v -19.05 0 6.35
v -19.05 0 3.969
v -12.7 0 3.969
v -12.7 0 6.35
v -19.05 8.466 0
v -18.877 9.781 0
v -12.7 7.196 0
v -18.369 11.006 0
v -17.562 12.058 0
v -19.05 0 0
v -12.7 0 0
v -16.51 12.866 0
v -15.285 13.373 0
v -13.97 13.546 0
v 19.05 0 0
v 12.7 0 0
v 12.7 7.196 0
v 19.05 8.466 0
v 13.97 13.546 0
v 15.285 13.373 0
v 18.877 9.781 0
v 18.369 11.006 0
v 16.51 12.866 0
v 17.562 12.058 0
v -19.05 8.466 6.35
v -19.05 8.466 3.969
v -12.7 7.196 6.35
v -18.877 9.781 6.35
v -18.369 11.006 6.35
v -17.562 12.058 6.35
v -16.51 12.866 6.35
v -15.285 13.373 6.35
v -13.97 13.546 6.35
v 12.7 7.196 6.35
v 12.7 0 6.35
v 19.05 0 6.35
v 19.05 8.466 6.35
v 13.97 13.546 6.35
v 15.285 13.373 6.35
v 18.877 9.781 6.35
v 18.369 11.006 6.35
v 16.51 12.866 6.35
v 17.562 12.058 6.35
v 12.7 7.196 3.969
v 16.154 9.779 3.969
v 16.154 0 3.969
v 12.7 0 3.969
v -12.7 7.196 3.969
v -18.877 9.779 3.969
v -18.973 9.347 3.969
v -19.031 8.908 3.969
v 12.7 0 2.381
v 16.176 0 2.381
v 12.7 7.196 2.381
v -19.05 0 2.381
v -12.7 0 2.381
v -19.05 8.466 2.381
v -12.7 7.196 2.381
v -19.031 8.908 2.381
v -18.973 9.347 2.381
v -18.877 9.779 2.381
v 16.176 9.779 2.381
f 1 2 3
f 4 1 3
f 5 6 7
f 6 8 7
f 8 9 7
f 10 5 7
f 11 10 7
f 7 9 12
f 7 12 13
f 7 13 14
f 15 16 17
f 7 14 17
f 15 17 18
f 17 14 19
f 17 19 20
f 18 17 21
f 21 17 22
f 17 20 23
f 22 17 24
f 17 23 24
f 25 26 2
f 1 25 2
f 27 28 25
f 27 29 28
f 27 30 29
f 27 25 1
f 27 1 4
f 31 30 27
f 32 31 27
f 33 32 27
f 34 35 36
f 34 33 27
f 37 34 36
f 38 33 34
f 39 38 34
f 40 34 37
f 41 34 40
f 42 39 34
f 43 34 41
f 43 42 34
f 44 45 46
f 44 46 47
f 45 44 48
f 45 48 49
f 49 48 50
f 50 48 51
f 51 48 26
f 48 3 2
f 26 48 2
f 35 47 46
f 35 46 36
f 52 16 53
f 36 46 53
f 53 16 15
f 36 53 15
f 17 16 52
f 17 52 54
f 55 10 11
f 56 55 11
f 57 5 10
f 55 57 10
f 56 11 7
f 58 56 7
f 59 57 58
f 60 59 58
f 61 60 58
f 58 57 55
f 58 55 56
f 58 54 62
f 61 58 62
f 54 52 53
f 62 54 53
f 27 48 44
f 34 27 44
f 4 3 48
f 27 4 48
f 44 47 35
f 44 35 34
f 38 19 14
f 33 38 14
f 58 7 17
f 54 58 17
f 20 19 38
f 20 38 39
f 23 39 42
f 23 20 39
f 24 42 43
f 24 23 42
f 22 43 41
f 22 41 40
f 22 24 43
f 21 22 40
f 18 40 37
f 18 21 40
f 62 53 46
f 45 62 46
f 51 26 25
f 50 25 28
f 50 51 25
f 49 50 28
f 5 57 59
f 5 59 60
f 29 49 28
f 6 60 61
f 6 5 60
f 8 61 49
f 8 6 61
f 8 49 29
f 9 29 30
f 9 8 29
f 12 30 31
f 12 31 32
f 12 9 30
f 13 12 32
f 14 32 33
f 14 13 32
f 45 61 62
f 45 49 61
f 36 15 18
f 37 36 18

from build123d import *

# Parameters (mm, degrees)
F0_W        = 6.35
F0_H        = 6.35
F0_H_2      = 7.196190767
F1_DEPTH    = 6.35
F2_W        = 6.35
F2_H        = 1.5875
F3_DEPTH    = 9.779
F4_T1_DEPTH = 31.75


# Not quite as in the source:
# - a fillet or chamfer that OpenCascade refuses, or shapes differently, is made with other operations: its cross-section is extruded or revolved along the edge and cut away or added


with BuildPart() as f1:
    # F0 (on Top) → F1 (new body)
    with BuildSketch(Plane.XY):
        Polygon((-12.7, 13.546190767), (-12.7, 7.196190767), (0, 7.196190767), (12.7, 7.196190767), (12.7, 13.546190767), align=None)
        with Locations((-15.875, 10.371190767)):
            Rectangle(F0_W, F0_H)
        with Locations((-15.875, 3.5980953835)):
            Rectangle(F0_W, F0_H_2)
        with Locations((15.875, 10.371190767)):
            Rectangle(F0_W, F0_H)
        with Locations((15.875, 3.5980953835)):
            Rectangle(F0_W, F0_H_2)
    extrude(amount=F1_DEPTH)

    # F2 (on face) → F3 (cut)
    with BuildSketch(Plane.XZ):
        Polygon((9.525, 3.96875), (-8.7374933064, 3.96875), (-12.7, 3.96875), (-12.7, 2.38125), (-8.7374933064, 2.38125), (9.525, 2.38125), align=None)
        Polygon((16.1540079862, 3.96875), (9.525, 3.96875), (9.525, 2.38125), (16.1763634533, 2.38125), align=None)
        with Locations((-15.875, 3.175)):
            Rectangle(F2_W, F2_H)
    extrude(amount=-F3_DEPTH, mode=Mode.SUBTRACT)

    # F4: fillet of radius 5.08 on 2 edges, made by hand

    # F4_s2 → F4_t1 (cut)
    with BuildSketch(Plane.XY.offset(-12.7)):
        with BuildLine():
            ThreePointArc((13.97, 13.546190767), (17.5621024484, 12.0582932154), (19.05, 8.466190767))
            Line((19.05, 8.466190767), (19.05, 13.546190767))
            Line((19.05, 13.546190767), (13.97, 13.546190767))
        make_face()
        with BuildLine():
            ThreePointArc((-19.05, 8.466190767), (-17.5621024484, 12.0582932154), (-13.97, 13.546190767))
            Line((-13.97, 13.546190767), (-19.05, 13.546190767))
            Line((-19.05, 13.546190767), (-19.05, 8.466190767))
        make_face()
    extrude(amount=F4_T1_DEPTH, mode=Mode.SUBTRACT)


solid = f1.part
